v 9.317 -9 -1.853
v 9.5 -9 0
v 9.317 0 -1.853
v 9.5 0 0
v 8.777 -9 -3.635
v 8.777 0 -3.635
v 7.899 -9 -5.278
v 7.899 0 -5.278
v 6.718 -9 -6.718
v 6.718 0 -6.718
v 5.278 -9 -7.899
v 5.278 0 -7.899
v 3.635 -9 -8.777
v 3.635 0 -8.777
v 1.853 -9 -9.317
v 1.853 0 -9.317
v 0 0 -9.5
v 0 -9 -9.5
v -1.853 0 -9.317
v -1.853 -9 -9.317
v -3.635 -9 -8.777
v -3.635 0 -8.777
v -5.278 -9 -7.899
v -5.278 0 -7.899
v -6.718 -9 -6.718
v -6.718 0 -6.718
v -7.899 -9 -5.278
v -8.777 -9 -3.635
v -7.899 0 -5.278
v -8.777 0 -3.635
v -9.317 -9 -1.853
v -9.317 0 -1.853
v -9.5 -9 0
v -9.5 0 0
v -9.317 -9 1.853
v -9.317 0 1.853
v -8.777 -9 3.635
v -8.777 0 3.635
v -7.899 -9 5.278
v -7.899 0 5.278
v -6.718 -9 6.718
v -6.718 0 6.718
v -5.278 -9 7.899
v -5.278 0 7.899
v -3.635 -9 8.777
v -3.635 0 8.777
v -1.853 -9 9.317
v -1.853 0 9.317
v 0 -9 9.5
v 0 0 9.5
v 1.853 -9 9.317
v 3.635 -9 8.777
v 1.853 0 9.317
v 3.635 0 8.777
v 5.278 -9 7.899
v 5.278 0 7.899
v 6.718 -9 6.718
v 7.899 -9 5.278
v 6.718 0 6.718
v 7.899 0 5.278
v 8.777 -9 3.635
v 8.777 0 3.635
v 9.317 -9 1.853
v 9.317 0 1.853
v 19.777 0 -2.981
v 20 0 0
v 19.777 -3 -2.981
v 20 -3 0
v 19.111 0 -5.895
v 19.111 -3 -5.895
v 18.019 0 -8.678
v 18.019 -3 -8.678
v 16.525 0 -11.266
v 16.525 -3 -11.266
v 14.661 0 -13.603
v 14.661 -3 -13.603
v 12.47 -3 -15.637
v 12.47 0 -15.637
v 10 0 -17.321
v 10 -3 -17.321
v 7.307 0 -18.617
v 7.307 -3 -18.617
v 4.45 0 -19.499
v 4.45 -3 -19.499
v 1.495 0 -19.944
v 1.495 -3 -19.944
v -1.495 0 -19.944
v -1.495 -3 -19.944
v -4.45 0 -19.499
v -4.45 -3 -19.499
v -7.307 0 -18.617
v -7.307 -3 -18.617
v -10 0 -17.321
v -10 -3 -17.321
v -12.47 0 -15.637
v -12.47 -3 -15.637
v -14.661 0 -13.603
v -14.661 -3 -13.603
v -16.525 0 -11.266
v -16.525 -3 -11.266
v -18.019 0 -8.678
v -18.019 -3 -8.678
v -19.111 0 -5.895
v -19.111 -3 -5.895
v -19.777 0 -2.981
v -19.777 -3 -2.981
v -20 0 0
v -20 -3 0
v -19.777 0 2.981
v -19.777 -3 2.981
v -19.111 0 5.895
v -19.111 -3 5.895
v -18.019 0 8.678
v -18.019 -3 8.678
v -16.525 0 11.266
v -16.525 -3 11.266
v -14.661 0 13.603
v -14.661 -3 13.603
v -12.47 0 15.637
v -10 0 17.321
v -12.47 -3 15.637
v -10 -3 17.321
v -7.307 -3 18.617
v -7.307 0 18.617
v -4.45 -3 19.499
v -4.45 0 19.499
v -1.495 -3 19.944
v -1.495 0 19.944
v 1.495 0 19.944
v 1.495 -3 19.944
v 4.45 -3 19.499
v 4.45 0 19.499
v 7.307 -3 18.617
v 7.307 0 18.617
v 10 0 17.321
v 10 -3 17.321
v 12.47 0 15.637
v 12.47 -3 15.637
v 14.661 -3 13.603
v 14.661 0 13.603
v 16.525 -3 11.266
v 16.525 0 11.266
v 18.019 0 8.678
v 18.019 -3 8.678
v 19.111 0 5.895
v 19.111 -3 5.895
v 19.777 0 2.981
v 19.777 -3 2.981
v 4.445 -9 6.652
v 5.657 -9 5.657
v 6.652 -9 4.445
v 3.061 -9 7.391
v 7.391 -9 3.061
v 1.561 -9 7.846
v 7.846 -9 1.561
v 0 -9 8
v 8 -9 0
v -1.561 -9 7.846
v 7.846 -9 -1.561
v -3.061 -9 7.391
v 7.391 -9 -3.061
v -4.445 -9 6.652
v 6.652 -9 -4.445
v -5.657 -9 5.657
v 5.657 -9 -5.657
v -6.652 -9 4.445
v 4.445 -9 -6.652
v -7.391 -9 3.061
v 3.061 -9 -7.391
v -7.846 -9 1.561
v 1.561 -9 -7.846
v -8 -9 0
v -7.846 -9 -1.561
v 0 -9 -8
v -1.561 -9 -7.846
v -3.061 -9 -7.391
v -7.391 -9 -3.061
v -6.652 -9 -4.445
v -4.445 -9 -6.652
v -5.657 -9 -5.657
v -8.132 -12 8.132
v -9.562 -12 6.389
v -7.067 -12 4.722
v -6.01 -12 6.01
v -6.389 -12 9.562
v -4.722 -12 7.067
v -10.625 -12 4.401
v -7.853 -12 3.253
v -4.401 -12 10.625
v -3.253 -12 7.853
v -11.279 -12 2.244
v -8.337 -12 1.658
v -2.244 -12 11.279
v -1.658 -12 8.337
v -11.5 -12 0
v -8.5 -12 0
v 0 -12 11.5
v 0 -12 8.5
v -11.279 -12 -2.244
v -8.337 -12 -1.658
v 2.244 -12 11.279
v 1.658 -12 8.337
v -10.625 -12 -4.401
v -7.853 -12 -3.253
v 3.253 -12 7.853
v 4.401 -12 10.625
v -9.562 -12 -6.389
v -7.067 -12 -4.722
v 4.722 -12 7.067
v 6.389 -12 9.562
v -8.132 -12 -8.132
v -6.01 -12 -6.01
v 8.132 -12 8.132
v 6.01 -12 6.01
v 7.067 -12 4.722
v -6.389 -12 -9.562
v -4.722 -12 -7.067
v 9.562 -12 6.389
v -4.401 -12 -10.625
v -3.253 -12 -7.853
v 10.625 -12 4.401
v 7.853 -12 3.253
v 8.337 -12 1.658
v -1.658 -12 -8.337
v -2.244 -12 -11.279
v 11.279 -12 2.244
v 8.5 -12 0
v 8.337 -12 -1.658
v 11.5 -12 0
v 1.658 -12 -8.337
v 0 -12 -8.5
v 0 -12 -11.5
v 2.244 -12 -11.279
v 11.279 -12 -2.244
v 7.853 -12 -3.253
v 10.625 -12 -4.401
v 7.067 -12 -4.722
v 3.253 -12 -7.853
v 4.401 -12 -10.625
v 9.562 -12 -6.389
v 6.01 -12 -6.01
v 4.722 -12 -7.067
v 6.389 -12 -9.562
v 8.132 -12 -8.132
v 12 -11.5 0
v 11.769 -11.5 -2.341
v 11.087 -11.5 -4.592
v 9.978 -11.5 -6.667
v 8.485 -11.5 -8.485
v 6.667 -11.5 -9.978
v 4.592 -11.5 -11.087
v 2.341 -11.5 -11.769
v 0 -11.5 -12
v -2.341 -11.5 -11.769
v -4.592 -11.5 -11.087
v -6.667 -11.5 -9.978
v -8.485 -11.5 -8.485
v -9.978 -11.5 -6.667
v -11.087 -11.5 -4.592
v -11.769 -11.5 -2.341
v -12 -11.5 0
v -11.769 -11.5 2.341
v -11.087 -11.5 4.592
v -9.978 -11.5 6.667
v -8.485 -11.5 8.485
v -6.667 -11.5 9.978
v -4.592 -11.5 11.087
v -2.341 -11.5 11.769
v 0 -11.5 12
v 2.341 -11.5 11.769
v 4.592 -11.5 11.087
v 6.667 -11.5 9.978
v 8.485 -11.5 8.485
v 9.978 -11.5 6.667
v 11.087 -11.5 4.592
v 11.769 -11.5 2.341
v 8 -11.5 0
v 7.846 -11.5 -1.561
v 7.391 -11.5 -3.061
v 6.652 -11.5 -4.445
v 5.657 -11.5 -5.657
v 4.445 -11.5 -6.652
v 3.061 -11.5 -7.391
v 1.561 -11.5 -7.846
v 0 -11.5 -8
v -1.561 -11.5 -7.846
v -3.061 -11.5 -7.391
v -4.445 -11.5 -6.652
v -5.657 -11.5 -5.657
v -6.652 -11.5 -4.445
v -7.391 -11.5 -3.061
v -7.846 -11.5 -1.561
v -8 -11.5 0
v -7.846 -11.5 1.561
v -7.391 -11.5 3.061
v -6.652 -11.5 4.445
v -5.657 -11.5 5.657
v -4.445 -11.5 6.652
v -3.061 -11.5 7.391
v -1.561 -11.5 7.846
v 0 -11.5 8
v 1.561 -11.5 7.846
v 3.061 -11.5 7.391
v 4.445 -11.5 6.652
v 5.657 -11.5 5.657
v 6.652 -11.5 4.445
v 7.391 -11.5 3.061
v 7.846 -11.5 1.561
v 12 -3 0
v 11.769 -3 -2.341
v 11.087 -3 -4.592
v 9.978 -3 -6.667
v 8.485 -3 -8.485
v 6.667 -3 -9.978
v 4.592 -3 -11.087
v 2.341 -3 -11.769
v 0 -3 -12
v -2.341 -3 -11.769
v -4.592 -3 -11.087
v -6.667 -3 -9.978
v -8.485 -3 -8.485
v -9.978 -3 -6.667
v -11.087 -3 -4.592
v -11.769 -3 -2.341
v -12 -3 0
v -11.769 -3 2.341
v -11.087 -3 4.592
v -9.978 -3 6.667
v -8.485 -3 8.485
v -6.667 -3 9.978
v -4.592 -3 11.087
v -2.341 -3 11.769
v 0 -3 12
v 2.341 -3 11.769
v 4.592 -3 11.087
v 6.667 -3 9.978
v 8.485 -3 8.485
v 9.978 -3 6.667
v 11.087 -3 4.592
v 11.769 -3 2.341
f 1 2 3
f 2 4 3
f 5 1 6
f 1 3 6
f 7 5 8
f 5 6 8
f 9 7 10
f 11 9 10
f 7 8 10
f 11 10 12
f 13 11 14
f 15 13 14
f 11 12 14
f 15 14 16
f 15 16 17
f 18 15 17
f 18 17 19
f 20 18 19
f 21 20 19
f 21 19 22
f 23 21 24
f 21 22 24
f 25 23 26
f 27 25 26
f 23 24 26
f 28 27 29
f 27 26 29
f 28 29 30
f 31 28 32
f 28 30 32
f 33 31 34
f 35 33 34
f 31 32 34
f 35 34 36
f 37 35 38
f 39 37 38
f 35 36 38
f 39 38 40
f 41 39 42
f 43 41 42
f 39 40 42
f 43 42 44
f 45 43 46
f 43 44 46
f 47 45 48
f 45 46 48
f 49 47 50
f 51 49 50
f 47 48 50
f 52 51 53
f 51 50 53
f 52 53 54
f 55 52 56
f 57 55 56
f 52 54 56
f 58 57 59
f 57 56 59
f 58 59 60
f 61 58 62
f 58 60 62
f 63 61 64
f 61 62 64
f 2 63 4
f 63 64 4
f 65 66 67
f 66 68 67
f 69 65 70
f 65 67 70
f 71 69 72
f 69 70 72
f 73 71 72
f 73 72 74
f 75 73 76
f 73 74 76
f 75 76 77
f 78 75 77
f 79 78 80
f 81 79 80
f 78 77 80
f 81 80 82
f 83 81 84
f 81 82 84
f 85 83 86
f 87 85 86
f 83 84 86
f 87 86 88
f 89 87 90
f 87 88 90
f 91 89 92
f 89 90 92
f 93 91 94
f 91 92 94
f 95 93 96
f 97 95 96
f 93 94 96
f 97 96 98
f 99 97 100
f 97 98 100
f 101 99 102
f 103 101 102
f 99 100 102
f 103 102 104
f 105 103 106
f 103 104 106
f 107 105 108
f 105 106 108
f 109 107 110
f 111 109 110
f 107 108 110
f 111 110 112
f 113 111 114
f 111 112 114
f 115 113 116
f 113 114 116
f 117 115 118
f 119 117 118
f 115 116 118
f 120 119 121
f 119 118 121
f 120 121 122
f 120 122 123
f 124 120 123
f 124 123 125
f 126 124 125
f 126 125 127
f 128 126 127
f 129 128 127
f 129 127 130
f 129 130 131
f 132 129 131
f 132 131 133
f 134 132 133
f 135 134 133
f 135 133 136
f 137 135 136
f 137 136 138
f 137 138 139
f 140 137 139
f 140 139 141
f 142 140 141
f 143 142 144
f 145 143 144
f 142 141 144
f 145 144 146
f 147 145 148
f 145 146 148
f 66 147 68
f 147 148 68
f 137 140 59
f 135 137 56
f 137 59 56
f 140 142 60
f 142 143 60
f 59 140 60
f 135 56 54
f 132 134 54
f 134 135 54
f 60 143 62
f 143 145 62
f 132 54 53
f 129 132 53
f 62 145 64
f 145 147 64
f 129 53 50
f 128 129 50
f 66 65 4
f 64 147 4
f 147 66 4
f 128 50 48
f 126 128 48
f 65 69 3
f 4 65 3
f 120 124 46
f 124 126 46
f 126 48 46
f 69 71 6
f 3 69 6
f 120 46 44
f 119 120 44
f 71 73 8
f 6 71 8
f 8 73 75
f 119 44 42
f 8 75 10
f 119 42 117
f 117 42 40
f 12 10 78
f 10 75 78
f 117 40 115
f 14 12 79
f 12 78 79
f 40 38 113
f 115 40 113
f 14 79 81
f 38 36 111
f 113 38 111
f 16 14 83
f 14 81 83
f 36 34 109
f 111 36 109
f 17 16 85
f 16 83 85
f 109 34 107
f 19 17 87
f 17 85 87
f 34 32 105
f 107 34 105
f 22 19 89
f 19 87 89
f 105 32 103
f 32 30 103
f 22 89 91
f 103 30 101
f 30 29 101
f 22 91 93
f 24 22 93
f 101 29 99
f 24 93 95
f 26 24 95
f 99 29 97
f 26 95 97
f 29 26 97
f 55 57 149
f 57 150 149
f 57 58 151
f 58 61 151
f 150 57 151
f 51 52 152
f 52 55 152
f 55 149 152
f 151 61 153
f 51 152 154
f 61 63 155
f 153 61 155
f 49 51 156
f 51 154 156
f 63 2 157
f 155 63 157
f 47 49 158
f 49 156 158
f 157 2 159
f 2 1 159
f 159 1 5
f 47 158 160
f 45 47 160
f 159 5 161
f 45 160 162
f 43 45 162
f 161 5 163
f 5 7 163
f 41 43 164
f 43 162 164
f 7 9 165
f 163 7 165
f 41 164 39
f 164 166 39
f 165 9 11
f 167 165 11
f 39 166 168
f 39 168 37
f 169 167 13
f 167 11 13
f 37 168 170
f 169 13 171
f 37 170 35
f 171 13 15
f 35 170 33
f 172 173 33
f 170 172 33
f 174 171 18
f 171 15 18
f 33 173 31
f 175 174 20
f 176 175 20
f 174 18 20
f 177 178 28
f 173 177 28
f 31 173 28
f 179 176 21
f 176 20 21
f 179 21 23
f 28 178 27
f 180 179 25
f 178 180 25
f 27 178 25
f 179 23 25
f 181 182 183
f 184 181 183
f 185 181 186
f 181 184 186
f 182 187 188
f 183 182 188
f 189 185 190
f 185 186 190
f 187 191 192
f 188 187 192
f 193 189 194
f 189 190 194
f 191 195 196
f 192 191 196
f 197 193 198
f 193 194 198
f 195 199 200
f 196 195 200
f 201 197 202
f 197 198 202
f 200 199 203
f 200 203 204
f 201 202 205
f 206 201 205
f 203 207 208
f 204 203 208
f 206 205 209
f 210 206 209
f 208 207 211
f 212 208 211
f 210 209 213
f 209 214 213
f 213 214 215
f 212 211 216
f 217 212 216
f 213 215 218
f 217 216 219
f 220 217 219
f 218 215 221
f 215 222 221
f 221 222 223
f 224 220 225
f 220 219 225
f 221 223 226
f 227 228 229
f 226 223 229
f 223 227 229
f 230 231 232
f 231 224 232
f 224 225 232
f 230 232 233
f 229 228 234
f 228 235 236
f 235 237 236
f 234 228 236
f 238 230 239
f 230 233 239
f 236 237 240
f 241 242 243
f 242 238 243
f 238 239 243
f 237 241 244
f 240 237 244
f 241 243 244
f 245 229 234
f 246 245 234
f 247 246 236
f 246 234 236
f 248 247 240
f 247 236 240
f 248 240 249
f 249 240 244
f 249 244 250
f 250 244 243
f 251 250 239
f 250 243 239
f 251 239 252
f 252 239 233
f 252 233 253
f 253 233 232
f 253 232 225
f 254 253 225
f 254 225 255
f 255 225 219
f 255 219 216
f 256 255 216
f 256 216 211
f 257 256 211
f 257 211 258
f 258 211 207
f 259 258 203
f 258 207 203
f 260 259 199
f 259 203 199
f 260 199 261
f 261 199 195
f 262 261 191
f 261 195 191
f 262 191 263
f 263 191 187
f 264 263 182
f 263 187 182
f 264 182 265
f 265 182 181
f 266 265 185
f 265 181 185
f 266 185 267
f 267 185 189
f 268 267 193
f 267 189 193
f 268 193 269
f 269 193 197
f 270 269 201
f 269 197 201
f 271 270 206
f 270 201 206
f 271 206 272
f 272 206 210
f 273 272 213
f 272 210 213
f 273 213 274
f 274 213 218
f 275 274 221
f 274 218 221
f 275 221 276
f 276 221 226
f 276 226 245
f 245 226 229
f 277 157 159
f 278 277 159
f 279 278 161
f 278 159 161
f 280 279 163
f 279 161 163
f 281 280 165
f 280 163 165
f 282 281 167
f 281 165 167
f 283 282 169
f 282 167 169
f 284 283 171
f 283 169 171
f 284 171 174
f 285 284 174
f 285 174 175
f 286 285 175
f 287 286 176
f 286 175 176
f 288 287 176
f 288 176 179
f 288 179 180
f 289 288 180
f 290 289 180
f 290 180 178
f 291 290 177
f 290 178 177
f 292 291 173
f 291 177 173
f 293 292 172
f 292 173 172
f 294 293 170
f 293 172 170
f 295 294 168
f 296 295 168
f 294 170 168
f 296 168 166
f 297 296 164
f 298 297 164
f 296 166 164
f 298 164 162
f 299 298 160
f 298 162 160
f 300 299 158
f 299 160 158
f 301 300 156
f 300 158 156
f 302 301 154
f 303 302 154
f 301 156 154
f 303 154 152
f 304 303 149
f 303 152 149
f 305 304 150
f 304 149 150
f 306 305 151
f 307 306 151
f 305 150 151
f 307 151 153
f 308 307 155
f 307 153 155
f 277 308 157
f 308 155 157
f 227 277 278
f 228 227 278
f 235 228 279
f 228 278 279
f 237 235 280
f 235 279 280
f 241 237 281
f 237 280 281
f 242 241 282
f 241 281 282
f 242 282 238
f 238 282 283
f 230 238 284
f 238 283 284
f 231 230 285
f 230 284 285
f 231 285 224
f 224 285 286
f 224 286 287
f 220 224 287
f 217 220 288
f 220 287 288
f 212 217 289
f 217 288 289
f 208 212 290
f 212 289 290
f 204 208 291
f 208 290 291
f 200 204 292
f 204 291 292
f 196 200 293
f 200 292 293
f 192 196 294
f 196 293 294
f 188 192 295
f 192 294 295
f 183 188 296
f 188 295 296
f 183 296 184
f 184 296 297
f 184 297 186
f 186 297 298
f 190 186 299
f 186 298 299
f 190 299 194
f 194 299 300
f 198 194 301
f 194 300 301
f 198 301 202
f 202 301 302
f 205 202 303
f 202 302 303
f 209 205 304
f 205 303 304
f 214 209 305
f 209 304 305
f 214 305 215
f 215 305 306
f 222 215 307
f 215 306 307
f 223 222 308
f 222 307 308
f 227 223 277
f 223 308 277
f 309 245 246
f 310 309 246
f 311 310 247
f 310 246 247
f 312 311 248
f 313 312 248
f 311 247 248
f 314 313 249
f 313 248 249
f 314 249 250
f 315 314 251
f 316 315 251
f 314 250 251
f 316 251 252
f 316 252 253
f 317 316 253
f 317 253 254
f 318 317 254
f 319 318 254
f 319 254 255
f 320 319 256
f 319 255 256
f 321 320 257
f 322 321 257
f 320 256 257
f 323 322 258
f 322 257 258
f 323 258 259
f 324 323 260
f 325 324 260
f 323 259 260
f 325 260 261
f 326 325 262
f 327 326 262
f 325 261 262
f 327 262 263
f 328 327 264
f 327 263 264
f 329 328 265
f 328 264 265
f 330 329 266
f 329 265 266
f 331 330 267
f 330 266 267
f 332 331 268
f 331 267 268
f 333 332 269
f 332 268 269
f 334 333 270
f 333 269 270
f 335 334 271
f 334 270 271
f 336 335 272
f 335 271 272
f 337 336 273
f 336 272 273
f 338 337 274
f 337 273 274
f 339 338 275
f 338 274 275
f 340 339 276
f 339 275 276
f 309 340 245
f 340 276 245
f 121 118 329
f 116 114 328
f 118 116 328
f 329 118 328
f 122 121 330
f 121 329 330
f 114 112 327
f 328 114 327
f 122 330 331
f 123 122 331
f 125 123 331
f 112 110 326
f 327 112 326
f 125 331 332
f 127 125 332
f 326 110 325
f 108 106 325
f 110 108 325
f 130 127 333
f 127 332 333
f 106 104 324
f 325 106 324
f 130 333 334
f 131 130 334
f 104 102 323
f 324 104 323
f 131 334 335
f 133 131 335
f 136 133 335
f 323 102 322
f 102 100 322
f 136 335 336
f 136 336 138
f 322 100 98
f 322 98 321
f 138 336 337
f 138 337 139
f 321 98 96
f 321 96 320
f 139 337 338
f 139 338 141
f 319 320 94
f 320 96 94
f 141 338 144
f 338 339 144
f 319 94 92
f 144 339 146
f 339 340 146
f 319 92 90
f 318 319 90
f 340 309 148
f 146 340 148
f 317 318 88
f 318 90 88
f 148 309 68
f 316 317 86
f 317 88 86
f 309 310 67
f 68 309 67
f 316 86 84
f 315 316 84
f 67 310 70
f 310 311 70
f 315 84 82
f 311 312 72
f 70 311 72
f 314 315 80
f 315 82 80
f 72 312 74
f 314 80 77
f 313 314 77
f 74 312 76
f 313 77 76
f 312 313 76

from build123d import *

# Parameters (mm, degrees)
SMUSSO1_SIZE = 0.5


with BuildPart() as part:
    # Schizzo1 → Rivoluzione1 (revolve)
    with BuildSketch(Plane.XY):
        Polygon((9.5, 0), (20, 0), (20, -3), (12, -3), (12, -12), (8, -12), (8, -9), (9.5, -9), align=None)
    revolve(axis=Axis((0, -37.45263556, 0), (0, 1, 0)))

    # Smusso1
    smusso1_edges = [part.edges().sort_by_distance(p)[0] for p in [
        (-8, -12, 0),
        (-12, -12, 0),
    ]]
    chamfer(smusso1_edges, length=SMUSSO1_SIZE)


solid = part.part
